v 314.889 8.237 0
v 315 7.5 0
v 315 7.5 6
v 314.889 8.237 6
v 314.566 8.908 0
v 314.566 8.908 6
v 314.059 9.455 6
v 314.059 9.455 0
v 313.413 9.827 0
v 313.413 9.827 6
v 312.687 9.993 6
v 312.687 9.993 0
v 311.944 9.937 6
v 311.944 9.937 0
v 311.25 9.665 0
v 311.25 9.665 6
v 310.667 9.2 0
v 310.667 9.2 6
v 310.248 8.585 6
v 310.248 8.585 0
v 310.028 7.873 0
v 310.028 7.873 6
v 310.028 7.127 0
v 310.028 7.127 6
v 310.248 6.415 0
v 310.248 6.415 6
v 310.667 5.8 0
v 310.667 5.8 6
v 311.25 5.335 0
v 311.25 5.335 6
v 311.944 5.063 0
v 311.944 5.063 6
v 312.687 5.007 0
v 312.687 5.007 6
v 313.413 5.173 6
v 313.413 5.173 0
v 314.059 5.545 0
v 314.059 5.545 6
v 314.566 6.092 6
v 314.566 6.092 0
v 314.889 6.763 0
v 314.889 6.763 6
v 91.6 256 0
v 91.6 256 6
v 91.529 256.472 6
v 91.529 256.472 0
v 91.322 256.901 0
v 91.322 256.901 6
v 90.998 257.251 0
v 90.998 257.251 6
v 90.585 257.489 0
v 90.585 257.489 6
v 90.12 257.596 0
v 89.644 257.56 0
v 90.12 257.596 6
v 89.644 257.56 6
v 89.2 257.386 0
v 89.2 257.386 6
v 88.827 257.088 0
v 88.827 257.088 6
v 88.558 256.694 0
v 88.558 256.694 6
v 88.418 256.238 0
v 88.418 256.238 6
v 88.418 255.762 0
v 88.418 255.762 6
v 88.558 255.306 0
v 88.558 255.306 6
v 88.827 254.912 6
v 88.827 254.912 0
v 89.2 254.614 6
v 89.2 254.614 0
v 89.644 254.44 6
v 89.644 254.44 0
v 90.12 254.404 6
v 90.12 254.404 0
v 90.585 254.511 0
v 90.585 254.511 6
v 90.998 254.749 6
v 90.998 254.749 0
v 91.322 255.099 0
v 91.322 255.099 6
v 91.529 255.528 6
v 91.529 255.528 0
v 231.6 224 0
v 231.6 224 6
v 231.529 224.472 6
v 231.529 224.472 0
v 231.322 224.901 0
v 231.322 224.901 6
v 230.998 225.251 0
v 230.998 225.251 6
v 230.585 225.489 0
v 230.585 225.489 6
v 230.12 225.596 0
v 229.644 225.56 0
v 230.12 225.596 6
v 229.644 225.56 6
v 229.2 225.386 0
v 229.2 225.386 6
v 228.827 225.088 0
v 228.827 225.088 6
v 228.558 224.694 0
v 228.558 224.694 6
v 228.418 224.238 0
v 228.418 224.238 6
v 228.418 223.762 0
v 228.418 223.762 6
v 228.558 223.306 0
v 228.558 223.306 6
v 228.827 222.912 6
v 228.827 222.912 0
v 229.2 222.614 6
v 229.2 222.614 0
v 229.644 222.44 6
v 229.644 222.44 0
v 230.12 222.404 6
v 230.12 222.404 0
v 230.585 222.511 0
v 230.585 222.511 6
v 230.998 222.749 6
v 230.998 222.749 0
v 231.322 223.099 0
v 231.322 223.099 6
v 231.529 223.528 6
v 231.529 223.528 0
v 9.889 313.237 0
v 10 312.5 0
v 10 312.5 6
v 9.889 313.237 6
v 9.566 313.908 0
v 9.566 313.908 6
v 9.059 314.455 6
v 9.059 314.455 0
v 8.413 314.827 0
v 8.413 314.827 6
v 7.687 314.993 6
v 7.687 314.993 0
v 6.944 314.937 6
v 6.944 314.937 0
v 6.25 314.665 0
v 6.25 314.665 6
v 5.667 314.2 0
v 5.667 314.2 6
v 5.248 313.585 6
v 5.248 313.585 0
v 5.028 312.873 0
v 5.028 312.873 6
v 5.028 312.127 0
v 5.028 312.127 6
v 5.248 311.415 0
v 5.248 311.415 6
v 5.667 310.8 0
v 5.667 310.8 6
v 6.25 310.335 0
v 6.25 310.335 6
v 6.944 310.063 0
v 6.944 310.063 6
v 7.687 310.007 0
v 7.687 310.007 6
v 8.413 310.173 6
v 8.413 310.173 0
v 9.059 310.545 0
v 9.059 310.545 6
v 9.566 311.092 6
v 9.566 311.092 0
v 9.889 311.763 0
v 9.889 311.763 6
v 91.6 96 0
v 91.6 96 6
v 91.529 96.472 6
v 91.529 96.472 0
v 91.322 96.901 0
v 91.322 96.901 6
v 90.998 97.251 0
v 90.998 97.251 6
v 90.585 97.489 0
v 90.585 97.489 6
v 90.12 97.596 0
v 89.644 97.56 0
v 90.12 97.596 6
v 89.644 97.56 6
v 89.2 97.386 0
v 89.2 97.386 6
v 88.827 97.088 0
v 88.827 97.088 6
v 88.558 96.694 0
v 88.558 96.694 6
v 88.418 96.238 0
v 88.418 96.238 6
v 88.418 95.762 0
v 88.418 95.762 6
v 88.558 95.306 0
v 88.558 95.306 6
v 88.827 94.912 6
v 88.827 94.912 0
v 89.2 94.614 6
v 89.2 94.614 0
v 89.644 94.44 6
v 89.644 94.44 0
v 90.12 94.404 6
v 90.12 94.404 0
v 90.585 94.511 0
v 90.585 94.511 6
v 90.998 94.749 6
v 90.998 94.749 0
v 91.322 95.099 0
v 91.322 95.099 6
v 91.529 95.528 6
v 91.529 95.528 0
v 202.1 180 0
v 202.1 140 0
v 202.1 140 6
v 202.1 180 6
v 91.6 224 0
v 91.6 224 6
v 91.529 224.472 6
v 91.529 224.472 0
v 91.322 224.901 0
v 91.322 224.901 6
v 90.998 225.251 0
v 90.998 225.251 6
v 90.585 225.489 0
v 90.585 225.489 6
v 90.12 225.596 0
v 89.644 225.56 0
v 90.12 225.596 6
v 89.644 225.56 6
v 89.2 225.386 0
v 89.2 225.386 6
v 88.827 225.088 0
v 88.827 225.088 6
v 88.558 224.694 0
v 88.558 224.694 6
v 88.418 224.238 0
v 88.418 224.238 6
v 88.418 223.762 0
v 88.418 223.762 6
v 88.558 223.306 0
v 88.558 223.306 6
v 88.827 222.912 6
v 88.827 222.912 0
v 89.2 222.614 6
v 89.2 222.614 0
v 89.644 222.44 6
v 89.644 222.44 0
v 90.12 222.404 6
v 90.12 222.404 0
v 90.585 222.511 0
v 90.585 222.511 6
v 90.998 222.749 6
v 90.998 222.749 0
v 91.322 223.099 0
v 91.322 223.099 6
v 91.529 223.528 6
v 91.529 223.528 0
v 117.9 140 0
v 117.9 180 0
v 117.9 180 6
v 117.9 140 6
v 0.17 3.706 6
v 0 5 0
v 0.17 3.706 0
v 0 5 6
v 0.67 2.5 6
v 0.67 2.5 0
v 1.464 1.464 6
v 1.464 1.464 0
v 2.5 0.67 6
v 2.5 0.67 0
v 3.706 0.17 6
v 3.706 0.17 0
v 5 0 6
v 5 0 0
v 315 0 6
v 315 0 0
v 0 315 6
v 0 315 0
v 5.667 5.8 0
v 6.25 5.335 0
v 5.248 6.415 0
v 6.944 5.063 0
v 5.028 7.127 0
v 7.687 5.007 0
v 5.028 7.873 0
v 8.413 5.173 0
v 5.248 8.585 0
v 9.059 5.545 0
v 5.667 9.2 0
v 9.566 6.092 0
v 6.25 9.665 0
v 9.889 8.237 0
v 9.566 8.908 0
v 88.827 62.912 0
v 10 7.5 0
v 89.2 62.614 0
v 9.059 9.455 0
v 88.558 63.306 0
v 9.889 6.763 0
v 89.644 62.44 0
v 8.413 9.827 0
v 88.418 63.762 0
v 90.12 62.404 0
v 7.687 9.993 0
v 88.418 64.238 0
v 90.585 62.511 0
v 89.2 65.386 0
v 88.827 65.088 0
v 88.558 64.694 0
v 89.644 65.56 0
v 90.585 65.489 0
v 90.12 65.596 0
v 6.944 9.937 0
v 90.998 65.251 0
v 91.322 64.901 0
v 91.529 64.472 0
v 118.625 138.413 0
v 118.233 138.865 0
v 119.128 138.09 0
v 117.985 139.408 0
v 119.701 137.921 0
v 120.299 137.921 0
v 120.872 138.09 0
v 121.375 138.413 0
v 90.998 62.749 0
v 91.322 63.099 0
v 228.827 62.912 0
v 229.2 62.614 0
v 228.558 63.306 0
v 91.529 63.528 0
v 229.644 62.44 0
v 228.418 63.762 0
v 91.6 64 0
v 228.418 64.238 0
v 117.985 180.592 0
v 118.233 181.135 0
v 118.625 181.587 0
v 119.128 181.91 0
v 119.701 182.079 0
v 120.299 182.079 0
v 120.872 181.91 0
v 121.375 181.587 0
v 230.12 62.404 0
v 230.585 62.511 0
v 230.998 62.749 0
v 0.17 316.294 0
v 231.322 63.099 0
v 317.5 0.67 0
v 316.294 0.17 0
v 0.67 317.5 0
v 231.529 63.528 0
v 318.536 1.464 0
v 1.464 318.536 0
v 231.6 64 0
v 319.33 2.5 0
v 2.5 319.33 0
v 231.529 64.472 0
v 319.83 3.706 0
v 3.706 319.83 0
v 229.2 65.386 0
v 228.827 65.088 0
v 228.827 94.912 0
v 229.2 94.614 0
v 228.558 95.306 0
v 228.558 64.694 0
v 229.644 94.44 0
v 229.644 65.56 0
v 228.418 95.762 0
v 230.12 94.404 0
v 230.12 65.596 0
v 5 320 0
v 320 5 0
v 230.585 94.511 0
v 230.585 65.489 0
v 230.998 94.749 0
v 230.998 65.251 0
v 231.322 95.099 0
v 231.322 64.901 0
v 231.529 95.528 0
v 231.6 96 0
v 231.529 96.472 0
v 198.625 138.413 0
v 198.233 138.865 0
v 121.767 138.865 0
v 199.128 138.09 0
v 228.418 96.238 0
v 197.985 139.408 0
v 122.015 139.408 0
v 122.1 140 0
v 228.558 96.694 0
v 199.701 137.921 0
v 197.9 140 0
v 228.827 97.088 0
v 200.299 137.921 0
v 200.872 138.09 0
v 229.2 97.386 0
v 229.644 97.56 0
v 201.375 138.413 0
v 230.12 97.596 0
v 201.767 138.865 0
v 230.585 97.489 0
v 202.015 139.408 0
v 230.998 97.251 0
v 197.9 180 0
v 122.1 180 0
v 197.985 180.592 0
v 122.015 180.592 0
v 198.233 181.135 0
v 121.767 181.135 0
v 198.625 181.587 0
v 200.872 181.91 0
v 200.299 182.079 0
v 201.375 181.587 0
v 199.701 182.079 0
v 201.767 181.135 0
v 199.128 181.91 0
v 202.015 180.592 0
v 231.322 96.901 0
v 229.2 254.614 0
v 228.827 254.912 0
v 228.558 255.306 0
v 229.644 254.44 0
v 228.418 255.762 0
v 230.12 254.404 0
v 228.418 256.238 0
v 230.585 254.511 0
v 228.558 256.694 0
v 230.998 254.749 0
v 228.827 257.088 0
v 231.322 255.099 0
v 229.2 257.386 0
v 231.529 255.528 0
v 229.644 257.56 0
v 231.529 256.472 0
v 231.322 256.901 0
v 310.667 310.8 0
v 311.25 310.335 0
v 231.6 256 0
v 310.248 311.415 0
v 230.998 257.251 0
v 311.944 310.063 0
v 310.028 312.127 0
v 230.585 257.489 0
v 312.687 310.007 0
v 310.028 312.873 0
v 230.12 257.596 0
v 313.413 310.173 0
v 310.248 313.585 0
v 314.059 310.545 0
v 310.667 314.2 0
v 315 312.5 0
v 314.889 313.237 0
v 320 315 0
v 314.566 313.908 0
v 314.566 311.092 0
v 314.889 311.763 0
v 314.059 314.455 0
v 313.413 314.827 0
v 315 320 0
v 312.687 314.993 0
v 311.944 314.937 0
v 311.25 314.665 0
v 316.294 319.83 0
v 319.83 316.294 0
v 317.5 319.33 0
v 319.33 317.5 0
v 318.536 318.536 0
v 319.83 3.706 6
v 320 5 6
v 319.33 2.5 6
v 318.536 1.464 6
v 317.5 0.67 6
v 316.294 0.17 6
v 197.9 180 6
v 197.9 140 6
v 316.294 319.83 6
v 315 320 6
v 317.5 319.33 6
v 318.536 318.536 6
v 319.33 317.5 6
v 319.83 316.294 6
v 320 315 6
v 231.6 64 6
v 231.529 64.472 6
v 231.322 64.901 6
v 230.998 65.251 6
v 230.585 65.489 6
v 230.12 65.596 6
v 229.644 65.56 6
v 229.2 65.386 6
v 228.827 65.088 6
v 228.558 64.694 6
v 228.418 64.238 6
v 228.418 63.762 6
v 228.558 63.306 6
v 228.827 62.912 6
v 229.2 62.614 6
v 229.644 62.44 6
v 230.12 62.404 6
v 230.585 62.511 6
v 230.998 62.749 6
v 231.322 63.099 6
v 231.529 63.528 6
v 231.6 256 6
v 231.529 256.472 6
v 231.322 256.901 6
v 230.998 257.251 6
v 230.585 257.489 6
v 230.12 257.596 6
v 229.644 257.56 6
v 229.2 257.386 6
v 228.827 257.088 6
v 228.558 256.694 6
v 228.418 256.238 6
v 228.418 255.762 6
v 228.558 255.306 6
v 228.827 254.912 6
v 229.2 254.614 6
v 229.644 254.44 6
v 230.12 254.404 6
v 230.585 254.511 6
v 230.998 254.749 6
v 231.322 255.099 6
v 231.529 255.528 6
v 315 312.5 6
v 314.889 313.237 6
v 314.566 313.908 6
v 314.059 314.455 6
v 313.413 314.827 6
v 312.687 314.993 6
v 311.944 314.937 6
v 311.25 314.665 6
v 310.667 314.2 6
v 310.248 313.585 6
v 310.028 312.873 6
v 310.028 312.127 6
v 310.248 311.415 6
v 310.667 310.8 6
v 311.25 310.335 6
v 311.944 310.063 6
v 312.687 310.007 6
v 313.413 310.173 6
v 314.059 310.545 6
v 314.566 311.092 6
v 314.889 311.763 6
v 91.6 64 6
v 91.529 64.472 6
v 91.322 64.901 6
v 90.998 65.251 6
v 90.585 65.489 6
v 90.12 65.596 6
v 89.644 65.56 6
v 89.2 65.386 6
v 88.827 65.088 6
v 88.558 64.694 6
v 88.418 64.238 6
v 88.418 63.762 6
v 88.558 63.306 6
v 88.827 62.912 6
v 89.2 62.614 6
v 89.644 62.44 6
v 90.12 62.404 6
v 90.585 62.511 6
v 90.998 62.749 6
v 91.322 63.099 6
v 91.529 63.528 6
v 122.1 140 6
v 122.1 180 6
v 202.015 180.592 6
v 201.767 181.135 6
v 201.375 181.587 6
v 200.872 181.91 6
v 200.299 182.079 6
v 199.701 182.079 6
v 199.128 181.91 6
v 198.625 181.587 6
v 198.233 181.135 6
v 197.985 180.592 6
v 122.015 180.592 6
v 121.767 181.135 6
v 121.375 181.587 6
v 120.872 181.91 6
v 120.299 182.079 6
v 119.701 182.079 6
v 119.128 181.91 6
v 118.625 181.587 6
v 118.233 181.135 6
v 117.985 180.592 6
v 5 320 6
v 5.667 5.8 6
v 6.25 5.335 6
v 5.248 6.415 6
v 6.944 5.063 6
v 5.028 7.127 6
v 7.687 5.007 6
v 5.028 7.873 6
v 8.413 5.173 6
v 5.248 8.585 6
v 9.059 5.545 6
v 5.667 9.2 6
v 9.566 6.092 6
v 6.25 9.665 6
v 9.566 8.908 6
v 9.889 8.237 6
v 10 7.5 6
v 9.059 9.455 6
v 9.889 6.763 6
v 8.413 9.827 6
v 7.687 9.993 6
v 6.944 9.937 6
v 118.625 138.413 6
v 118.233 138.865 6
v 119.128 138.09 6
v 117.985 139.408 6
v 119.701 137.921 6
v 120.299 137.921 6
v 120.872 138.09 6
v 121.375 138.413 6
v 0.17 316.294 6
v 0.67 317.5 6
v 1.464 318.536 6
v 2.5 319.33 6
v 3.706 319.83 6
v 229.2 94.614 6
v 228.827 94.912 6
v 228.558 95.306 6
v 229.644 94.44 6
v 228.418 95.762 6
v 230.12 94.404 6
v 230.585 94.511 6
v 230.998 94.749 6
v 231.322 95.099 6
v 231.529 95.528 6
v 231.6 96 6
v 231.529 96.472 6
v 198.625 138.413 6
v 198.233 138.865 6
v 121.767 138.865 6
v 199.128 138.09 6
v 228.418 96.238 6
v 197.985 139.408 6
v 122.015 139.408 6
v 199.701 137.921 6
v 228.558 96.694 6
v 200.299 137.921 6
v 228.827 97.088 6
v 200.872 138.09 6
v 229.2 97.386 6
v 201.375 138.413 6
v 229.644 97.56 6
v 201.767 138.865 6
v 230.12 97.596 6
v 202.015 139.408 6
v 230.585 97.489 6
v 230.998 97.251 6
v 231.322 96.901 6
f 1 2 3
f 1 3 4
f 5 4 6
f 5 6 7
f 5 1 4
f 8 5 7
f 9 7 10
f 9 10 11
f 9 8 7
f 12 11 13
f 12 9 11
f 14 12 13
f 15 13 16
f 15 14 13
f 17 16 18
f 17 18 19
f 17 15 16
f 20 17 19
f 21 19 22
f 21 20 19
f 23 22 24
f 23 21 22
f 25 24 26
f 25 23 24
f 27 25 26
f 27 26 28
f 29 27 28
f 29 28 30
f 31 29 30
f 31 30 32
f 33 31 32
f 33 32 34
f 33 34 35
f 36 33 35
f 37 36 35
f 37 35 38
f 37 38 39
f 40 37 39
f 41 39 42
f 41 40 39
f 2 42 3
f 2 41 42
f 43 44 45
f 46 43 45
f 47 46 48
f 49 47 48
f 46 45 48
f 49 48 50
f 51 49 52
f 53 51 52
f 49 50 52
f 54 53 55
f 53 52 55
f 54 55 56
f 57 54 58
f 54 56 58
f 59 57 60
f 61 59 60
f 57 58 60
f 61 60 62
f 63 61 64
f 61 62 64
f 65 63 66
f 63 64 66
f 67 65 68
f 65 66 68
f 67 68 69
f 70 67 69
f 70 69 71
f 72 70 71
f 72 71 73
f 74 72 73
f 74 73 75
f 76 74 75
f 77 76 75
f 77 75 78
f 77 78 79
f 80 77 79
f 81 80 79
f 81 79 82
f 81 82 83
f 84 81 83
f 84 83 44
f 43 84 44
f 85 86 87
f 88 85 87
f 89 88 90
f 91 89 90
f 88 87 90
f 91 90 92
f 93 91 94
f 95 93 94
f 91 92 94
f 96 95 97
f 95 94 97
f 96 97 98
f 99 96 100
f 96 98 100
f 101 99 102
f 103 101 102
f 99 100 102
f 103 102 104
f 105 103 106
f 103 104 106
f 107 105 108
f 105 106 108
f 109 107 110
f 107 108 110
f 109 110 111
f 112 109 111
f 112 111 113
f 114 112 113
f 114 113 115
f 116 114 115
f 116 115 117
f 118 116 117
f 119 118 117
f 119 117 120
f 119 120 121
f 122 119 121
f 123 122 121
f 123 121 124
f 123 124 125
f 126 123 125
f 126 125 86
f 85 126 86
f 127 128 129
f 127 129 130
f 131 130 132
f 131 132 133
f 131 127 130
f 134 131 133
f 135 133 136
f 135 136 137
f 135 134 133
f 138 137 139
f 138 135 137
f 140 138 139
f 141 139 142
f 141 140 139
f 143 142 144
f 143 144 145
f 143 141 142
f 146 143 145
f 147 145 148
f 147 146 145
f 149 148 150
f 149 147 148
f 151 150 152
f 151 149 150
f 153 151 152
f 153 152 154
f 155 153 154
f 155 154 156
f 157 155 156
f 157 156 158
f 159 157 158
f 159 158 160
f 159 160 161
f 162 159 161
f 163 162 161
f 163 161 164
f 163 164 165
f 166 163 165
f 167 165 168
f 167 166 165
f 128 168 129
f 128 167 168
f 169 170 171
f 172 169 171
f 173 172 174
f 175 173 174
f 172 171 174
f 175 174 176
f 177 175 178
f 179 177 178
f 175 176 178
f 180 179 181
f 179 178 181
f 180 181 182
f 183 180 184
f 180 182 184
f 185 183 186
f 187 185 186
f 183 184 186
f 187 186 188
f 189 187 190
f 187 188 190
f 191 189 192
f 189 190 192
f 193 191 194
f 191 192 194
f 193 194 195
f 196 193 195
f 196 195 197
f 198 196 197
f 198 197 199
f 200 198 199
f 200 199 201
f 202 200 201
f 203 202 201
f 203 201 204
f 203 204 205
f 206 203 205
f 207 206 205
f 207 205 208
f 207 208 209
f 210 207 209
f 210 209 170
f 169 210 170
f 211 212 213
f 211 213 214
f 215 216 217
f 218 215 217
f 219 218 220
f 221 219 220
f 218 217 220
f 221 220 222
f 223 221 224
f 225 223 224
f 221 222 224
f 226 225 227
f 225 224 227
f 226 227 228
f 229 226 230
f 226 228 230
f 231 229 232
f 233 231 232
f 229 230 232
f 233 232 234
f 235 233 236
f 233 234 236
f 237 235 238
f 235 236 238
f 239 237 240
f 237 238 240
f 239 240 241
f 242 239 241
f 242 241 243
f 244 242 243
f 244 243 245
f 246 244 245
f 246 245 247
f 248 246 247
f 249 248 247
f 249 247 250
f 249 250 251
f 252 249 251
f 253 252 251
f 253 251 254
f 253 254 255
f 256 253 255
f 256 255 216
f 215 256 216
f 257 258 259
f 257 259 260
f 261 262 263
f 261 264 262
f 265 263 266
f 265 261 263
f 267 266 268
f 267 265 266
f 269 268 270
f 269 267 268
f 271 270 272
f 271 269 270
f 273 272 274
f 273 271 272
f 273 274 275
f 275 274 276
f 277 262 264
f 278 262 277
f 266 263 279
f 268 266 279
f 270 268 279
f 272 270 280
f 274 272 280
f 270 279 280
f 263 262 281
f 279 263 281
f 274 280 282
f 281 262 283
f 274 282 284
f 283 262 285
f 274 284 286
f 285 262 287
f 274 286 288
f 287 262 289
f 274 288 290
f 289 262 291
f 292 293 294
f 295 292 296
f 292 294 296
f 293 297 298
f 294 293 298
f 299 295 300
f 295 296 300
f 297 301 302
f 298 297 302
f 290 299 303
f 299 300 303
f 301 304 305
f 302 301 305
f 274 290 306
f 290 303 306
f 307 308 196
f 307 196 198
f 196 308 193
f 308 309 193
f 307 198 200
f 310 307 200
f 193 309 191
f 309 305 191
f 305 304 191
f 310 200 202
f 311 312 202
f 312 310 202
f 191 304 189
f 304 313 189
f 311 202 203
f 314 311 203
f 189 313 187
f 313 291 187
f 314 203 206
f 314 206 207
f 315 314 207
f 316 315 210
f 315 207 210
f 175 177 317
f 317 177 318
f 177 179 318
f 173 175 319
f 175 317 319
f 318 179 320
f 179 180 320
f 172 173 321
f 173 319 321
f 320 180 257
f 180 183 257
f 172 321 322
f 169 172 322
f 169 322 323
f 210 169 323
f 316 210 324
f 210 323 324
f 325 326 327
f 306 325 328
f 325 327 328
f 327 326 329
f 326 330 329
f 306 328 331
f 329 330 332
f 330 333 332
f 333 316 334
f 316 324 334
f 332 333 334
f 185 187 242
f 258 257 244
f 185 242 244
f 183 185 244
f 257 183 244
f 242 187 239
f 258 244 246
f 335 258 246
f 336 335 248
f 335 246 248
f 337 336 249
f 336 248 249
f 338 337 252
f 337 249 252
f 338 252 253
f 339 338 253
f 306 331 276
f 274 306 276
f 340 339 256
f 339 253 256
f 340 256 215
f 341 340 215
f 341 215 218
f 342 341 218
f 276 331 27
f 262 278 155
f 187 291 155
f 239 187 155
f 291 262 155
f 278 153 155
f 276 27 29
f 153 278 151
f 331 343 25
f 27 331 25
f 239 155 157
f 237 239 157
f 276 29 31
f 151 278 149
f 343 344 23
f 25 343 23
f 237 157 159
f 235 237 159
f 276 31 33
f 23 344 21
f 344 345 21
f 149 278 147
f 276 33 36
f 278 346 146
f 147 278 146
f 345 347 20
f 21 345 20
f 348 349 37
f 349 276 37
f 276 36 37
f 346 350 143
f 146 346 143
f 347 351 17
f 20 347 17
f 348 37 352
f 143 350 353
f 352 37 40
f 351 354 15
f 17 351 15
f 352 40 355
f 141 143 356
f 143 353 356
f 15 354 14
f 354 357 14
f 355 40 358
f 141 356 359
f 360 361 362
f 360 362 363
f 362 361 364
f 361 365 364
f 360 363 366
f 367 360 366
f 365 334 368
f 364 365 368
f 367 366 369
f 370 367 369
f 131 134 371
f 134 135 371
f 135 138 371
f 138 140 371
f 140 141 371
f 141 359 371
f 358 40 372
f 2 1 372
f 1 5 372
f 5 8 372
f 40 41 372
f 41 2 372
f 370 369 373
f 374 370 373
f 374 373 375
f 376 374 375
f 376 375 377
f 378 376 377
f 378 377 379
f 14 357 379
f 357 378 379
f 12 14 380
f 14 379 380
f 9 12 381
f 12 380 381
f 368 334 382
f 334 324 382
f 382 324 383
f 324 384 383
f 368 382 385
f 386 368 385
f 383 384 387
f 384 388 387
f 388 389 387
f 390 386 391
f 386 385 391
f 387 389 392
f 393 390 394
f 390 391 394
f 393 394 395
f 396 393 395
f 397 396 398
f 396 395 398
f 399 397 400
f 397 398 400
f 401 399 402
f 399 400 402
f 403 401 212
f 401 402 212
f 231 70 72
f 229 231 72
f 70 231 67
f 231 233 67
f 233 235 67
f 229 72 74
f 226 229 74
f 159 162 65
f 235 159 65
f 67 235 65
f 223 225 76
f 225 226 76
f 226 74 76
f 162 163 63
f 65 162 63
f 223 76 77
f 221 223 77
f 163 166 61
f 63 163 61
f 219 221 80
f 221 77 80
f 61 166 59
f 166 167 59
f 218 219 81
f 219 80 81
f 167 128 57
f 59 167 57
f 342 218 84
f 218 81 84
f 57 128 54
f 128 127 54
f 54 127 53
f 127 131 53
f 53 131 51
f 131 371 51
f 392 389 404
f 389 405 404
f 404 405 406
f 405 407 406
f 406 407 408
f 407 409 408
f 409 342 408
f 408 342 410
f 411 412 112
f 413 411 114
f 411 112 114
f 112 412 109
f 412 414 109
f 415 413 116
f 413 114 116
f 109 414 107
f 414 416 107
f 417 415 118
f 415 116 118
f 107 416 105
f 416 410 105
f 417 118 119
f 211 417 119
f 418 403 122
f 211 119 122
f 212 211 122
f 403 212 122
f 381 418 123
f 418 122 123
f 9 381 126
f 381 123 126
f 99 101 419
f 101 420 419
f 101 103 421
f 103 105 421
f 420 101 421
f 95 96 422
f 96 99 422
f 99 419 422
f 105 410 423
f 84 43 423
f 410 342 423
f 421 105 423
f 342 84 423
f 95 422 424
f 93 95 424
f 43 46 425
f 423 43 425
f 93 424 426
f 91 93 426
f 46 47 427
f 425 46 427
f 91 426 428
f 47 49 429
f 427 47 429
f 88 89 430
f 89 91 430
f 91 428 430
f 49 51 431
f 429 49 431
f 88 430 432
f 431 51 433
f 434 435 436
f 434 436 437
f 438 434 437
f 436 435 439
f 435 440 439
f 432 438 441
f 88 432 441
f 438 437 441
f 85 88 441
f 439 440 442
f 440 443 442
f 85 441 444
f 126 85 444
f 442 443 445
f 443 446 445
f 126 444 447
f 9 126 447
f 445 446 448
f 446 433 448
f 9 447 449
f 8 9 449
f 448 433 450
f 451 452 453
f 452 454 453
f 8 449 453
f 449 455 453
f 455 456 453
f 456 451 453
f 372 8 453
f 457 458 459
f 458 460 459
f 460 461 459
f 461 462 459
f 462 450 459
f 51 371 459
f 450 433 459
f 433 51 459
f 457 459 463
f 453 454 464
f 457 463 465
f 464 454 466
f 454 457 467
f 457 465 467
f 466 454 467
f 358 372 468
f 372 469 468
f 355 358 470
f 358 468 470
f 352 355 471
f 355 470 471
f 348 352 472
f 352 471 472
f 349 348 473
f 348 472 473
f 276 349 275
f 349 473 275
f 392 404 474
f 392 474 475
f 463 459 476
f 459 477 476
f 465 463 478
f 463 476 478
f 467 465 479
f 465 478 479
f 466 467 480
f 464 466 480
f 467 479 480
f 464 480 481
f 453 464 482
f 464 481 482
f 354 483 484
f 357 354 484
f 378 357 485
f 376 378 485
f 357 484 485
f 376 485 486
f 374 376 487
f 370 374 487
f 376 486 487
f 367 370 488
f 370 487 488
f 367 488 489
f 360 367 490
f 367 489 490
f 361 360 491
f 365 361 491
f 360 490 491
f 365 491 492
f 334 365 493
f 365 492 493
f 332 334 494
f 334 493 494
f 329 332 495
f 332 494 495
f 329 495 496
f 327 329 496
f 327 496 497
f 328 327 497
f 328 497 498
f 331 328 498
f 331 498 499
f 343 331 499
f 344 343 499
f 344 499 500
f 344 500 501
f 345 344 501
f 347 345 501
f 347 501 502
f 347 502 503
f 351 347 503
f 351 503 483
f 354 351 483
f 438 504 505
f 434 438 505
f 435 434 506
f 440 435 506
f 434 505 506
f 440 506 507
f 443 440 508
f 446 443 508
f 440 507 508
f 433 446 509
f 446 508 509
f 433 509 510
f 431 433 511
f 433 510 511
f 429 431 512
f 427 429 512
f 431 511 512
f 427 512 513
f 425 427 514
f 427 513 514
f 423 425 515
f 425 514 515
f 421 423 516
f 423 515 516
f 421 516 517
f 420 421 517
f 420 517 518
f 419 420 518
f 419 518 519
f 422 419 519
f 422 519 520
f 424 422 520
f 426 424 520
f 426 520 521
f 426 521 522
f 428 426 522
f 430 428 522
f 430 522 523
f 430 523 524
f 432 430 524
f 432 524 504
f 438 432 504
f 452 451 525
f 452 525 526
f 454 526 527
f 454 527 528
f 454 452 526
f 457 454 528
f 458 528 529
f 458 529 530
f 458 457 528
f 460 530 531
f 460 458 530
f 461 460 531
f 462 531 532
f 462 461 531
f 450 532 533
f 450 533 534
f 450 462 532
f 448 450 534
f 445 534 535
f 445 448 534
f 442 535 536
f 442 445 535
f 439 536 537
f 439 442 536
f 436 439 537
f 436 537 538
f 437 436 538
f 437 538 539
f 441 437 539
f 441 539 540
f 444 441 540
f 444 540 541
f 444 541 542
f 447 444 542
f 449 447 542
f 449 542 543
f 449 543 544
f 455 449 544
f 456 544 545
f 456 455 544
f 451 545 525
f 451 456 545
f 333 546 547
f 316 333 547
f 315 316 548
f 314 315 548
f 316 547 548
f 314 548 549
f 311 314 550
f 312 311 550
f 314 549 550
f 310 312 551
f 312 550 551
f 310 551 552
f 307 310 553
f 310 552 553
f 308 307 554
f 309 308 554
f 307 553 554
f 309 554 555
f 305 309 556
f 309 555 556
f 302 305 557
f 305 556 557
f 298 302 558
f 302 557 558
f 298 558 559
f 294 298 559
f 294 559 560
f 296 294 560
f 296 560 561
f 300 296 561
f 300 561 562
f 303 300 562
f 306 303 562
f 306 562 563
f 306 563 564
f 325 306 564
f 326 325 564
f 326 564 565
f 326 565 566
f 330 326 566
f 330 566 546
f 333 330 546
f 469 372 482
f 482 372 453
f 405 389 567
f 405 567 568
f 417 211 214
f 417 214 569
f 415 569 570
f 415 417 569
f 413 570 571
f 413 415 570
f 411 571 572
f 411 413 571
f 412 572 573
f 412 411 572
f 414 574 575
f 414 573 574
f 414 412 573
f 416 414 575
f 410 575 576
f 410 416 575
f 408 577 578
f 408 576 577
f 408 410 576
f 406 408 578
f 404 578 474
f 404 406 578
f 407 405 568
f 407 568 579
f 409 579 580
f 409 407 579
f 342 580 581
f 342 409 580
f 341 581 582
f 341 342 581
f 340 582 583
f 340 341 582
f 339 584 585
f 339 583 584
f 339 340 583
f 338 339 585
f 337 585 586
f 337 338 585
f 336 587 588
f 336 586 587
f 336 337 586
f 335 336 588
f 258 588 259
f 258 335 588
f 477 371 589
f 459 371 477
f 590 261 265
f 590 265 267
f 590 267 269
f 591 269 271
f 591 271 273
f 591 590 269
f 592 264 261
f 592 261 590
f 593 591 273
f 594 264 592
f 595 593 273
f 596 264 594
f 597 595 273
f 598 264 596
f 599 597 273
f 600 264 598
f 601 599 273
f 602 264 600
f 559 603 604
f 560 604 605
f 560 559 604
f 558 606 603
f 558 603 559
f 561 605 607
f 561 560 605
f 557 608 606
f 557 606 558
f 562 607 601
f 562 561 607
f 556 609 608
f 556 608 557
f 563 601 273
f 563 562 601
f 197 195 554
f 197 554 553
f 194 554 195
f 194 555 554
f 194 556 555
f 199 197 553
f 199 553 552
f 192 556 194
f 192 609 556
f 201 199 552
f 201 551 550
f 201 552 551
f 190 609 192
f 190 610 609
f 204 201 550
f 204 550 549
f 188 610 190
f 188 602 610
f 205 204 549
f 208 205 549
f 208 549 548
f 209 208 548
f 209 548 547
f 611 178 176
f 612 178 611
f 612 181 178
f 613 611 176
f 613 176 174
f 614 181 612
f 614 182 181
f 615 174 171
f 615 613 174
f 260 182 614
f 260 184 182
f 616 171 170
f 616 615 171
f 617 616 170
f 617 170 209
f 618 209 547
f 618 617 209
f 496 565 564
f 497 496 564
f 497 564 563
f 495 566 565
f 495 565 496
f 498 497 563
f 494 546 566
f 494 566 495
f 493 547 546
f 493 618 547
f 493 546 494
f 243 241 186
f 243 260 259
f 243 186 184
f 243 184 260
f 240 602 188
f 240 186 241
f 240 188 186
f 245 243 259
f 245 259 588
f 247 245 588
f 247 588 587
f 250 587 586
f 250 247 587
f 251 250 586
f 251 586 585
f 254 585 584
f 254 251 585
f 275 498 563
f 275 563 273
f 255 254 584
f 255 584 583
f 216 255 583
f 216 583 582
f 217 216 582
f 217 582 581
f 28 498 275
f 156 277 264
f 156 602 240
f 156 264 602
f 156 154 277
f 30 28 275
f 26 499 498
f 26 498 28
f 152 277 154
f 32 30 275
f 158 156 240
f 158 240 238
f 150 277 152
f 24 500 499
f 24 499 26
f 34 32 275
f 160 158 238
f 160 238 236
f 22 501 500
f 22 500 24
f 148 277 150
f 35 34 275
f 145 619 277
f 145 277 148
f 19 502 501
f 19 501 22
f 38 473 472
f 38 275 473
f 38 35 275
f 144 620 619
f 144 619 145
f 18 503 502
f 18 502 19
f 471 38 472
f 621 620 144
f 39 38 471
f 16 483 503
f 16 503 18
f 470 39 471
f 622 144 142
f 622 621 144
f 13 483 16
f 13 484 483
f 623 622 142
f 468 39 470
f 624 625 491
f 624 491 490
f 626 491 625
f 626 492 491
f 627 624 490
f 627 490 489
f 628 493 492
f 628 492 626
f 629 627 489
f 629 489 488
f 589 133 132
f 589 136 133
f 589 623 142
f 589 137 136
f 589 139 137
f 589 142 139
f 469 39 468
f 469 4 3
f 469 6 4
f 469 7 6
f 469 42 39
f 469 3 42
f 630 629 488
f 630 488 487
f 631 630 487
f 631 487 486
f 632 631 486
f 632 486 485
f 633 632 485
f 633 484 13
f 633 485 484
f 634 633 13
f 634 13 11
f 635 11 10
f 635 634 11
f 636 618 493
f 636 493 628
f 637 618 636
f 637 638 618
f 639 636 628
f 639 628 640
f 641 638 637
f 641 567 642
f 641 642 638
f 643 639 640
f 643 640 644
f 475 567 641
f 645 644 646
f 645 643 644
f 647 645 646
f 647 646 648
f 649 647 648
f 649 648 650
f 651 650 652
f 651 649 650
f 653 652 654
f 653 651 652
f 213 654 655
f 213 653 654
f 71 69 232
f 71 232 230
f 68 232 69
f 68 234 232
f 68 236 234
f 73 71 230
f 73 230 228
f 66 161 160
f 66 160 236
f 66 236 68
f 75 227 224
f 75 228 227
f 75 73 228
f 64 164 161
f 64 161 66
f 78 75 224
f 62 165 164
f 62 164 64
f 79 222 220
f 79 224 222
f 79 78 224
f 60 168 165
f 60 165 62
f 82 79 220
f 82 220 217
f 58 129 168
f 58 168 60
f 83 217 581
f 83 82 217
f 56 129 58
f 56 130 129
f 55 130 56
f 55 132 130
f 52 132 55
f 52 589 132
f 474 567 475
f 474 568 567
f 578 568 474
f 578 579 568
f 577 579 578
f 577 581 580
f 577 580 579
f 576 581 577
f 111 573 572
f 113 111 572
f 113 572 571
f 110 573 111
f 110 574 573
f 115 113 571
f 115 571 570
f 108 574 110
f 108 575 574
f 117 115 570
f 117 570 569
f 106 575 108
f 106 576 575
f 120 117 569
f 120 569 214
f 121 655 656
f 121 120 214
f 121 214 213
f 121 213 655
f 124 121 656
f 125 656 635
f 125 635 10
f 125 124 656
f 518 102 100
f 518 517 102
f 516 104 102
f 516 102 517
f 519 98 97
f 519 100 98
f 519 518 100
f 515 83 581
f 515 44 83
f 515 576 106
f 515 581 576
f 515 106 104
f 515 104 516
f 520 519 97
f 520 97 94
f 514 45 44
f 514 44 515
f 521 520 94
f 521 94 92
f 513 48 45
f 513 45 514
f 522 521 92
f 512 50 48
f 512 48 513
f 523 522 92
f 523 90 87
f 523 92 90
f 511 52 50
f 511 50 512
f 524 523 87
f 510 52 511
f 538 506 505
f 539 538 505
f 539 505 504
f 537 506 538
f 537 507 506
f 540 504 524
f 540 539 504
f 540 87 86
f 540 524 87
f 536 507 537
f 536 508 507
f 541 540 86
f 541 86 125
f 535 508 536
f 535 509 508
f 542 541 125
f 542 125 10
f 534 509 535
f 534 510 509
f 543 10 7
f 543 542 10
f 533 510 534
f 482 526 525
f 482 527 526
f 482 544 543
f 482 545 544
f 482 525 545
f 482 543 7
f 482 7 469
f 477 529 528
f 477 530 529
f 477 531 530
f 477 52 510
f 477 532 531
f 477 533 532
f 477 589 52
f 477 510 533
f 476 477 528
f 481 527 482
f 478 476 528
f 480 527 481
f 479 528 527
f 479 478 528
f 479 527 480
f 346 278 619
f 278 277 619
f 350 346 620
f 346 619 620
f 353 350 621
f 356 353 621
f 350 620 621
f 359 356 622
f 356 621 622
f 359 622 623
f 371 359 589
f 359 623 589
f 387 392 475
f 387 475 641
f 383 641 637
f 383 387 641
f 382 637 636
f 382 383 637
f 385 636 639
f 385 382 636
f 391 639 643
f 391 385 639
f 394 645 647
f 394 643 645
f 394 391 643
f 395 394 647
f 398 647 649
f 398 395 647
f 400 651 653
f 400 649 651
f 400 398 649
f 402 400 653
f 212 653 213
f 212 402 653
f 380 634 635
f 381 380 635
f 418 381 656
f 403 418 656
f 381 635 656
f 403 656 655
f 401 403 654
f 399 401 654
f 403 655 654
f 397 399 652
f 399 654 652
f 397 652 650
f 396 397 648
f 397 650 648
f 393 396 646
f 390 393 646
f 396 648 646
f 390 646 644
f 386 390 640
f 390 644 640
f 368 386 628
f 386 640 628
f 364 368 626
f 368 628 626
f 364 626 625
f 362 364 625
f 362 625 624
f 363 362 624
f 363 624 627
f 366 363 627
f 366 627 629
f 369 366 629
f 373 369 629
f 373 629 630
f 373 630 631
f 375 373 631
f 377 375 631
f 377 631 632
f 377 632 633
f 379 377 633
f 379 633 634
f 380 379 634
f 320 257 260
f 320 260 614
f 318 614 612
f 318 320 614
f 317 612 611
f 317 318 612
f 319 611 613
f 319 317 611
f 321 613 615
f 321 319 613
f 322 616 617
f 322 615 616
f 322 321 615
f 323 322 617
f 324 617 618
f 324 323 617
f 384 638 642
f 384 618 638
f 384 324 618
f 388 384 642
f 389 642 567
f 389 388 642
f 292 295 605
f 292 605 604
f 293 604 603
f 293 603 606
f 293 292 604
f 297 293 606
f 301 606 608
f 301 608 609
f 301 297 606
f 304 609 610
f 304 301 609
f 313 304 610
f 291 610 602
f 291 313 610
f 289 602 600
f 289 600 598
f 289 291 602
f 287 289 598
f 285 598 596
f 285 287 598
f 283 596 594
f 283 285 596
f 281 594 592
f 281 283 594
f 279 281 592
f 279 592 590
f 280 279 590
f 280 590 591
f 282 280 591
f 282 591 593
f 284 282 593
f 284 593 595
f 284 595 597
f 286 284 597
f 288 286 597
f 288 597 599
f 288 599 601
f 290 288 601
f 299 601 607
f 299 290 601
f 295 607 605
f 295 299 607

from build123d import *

# Parameters (mm, degrees)
ESQUISSE1_W        = 320
ESQUISSE1_H        = 320
ESQUISSE1_R        = 2.5
BOSS_EXTRU_1_DEPTH = 6
CONG_3_R           = 5
CONG_4_R           = 5
CONG_5_R           = 5
CONG_6_R           = 5
SKETCH1_R          = 1.6
CUT_EXTRUDE1_DEPTH = 7
CUT_EXTRUDE2_DEPTH = 7


with BuildPart() as part:
    # Esquisse1 → Boss.-Extru.1 (new body)
    with BuildSketch(Plane.XY):
        with Locations((160, 160)):
            Rectangle(ESQUISSE1_W, ESQUISSE1_H)
        with Locations((7.5, 312.5)):
            Circle(ESQUISSE1_R, mode=Mode.SUBTRACT)
        with Locations((312.5, 312.5)):
            Circle(ESQUISSE1_R, mode=Mode.SUBTRACT)
        with Locations((7.5, 7.5)):
            Circle(ESQUISSE1_R, mode=Mode.SUBTRACT)
        with Locations((312.5, 7.5)):
            Circle(ESQUISSE1_R, mode=Mode.SUBTRACT)
    extrude(amount=BOSS_EXTRU_1_DEPTH)

    # Congé3
    cong_3_edges = [part.edges().sort_by_distance(p)[0] for p in [
        (0, 320, 3),
    ]]
    fillet(cong_3_edges, radius=CONG_3_R)

    # Congé4
    cong_4_edges = [part.edges().sort_by_distance(p)[0] for p in [
        (0, 0, 3),
    ]]
    fillet(cong_4_edges, radius=CONG_4_R)

    # Congé5
    cong_5_edges = [part.edges().sort_by_distance(p)[0] for p in [
        (320, 320, 3),
    ]]
    fillet(cong_5_edges, radius=CONG_5_R)

    # Congé6
    cong_6_edges = [part.edges().sort_by_distance(p)[0] for p in [
        (320, 0, 3),
    ]]
    fillet(cong_6_edges, radius=CONG_6_R)

    # Sketch1 → Cut-Extrude1 (cut, through all)
    with BuildSketch(Plane.XY.offset(6)):
        with Locations((90, 224)):
            Circle(SKETCH1_R)
        with Locations((230, 224)):
            Circle(SKETCH1_R)
        with Locations((90, 96)):
            Circle(SKETCH1_R)
        with Locations((230, 96)):
            Circle(SKETCH1_R)
        with Locations((90, 256)):
            Circle(SKETCH1_R)
        with Locations((90, 64)):
            Circle(SKETCH1_R)
        with Locations((230, 64)):
            Circle(SKETCH1_R)
        with Locations((230, 256)):
            Circle(SKETCH1_R)
    extrude(amount=-CUT_EXTRUDE1_DEPTH, mode=Mode.SUBTRACT)

    # Sketch3 → Cut-Extrude2 (cut, through all)
    with BuildSketch(Plane(origin=(0, 0, 0), x_dir=(-1, 0, 0), z_dir=(0, 0, -1))):
        with BuildLine():
            Line((-197.9, 180), (-197.9, 140))
            ThreePointArc((-197.9, 140), (-200, 137.9), (-202.1, 140))
            Line((-202.1, 140), (-202.1, 180))
            ThreePointArc((-202.1, 180), (-200, 182.1), (-197.9, 180))
        make_face()
        with BuildLine():
            Line((-117.9, 180), (-117.9, 140))
            ThreePointArc((-117.9, 140), (-120, 137.9), (-122.1, 140))
            Line((-122.1, 140), (-122.1, 180))
            ThreePointArc((-122.1, 180), (-120, 182.1), (-117.9, 180))
        make_face()
    extrude(amount=-CUT_EXTRUDE2_DEPTH, mode=Mode.SUBTRACT)


solid = part.part
